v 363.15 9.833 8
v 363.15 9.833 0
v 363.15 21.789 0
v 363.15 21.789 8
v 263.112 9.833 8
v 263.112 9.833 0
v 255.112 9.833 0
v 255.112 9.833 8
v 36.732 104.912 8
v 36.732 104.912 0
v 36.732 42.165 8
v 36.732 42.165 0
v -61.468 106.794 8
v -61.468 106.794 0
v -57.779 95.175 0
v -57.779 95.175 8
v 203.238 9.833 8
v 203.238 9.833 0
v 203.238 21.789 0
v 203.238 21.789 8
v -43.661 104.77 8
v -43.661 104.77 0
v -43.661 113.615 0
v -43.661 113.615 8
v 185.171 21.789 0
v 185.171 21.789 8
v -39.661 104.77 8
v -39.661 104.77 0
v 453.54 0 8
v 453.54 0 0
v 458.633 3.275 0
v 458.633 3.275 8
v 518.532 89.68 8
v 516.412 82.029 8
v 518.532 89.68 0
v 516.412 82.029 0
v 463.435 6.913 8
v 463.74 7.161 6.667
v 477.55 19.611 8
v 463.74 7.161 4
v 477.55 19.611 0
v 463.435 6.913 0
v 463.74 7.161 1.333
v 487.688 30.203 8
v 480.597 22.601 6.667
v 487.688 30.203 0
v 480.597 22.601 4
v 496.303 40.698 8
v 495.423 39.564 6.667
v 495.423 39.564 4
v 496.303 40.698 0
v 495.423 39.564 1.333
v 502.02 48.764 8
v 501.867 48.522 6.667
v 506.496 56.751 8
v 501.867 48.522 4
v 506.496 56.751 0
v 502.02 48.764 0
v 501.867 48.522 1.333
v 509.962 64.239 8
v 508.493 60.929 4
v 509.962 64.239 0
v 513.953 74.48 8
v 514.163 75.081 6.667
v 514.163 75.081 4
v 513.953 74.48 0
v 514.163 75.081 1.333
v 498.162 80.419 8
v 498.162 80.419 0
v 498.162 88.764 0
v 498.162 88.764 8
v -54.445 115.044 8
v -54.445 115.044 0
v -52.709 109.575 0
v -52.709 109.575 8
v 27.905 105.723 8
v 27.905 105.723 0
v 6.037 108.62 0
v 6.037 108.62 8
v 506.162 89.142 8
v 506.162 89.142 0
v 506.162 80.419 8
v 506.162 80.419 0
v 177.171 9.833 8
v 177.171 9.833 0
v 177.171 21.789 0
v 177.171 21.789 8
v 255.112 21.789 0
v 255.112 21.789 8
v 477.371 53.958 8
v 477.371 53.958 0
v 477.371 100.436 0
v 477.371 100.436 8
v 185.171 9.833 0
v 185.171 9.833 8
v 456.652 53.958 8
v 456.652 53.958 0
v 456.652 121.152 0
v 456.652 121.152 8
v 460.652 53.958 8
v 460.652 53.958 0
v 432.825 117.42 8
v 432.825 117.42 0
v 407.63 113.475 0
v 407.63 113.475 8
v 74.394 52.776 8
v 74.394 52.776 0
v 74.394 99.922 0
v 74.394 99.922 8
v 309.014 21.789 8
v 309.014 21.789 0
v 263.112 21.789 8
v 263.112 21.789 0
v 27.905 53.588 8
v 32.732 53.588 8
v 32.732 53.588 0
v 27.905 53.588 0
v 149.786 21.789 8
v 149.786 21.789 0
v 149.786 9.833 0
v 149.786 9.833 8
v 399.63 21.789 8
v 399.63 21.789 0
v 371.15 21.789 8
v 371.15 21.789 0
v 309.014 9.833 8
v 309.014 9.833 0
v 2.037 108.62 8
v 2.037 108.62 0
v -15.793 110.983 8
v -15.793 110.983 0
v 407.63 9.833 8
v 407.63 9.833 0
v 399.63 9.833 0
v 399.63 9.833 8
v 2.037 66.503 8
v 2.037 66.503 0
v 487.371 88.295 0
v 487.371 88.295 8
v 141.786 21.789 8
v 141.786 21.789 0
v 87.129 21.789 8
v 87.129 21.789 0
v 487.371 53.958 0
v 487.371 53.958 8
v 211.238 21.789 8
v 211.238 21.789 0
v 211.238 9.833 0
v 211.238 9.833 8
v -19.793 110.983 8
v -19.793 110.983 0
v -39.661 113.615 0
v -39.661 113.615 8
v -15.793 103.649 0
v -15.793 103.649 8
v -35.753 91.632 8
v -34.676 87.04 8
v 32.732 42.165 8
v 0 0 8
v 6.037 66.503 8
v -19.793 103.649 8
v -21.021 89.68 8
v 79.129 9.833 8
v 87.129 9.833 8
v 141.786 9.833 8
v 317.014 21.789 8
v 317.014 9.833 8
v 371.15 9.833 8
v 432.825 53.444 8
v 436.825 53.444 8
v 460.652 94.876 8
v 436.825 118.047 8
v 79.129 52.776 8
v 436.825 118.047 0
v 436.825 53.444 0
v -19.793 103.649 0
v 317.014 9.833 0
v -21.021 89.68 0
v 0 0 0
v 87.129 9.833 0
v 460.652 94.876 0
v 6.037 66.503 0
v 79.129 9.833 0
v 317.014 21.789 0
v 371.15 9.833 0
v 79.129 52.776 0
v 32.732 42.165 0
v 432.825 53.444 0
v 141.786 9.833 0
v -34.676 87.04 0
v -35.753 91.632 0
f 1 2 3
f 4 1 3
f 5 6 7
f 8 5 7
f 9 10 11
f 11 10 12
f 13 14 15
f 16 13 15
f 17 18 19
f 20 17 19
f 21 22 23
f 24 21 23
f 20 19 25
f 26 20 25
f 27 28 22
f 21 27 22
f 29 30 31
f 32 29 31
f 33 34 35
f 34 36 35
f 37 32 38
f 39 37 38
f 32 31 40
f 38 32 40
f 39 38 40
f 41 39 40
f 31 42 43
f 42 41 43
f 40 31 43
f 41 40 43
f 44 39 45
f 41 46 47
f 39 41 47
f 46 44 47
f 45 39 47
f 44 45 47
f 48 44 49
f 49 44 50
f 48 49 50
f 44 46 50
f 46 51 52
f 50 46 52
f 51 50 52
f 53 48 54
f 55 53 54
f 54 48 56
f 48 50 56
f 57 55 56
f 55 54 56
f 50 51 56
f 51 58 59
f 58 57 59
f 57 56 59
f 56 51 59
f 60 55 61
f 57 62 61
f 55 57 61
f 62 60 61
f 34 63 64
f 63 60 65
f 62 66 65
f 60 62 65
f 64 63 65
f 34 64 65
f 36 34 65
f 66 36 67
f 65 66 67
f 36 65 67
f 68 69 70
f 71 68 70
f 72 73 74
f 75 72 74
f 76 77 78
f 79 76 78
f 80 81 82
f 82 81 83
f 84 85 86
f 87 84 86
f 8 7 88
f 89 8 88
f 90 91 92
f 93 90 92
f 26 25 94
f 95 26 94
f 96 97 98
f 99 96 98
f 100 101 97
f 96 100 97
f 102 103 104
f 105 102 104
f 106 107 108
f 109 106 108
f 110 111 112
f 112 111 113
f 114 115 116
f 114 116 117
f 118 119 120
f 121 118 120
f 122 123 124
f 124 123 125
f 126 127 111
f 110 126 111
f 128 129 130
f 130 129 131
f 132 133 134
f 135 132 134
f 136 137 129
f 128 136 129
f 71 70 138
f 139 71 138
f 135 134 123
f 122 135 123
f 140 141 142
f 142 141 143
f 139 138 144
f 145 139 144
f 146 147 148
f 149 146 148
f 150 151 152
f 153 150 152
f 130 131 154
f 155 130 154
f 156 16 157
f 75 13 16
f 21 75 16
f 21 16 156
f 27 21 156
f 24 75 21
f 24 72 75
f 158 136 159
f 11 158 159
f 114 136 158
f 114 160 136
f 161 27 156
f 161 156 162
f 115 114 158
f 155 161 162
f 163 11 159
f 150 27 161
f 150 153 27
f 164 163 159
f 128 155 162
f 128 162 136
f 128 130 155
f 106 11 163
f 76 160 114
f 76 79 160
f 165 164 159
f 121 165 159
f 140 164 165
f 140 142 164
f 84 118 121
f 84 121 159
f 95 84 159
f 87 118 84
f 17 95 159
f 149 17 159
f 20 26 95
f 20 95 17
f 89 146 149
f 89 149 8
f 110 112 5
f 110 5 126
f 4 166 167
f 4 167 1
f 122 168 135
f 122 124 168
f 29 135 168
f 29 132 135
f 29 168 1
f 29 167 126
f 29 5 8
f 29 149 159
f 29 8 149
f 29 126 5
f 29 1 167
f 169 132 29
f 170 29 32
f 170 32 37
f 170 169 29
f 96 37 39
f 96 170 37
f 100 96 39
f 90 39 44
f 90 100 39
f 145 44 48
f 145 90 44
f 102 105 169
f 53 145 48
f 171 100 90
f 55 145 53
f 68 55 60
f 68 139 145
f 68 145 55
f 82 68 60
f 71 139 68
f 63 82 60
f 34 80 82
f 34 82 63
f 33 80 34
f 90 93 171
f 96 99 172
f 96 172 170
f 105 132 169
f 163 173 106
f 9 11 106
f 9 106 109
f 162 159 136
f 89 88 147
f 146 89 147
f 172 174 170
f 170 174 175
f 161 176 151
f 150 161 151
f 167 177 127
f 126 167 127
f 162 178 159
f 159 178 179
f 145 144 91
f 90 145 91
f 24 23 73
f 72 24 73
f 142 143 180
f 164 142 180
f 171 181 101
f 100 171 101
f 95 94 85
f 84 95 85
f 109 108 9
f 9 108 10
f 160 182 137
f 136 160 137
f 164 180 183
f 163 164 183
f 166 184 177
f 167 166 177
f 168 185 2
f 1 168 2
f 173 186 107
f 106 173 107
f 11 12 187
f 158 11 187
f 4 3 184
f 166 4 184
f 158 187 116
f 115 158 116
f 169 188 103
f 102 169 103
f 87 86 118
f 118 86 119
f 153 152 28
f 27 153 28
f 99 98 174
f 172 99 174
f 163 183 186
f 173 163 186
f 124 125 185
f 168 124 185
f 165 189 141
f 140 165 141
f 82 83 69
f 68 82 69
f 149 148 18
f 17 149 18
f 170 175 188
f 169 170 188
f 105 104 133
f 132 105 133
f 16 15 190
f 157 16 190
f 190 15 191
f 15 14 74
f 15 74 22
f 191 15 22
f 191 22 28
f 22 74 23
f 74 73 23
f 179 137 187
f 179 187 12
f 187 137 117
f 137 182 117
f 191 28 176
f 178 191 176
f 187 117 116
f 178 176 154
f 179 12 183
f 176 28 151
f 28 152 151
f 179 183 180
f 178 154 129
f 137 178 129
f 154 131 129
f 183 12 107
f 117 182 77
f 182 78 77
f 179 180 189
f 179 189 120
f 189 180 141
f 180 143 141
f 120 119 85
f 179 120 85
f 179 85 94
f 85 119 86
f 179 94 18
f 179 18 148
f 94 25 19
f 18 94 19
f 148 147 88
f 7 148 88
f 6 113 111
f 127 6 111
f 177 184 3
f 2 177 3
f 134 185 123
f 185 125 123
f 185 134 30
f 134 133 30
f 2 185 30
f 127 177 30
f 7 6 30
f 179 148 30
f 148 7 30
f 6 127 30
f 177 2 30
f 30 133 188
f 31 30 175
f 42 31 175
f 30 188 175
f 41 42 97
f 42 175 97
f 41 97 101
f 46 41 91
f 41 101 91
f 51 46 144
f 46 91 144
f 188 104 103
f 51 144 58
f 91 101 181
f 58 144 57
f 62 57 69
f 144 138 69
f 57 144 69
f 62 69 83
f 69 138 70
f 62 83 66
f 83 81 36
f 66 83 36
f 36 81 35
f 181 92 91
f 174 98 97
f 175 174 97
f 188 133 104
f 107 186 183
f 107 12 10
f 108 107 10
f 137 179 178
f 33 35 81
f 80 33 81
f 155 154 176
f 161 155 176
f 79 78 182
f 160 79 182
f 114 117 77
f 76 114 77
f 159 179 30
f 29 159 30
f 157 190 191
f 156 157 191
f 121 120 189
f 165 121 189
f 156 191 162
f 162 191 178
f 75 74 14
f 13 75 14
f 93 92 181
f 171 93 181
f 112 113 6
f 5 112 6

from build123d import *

# Parameters (mm, degrees)
EXTRUDE_1_DEPTH = 8


with BuildPart() as part:
    # 草图1 → 凸台-拉伸1 (new body)
    with BuildSketch(Plane.XY):
        with BuildLine():
            Line((-2.43e-07, -1.66e-07), (453.540462303, -1.66e-07))
            add(Edge.make_bspline(
                [(453.540462303, -1.66e-07), (460.79014459, 4.210016878), (469.569935404, 12.072340183), (483.622239053, 25.284804164), (493.197401943, 36.434132834), (502.695793901, 49.189345623), (511.206090033, 65.729365299), (516.029726356, 79.831331018), (518.53173017, 89.679905798)],
                knots=[0, 0, 0, 0, 0.219529356, 0.311377144, 0.509994522, 0.607272861, 0.731274185, 1, 1, 1, 1], degree=3))
            Line((518.53173017, 89.679905798), (506.162046562, 89.142399996))
            Line((506.162046562, 89.142399996), (506.162046562, 80.419495843))
            Line((506.162046562, 80.419495843), (498.162046562, 80.419495843))
            Line((498.162046562, 80.419495843), (498.162046562, 88.764379516))
            Line((498.162046562, 88.764379516), (487.370707866, 88.295458294))
            Line((487.370707866, 88.295458294), (487.370707866, 53.957597962))
            Line((487.370707866, 53.957597962), (477.370707866, 53.957597962))
            Line((477.370707866, 53.957597962), (477.370707866, 100.436233428))
            Line((477.370707866, 100.436233428), (460.65154086, 94.876216939))
            Line((460.65154086, 94.876216939), (460.65154086, 53.957597679))
            Line((460.65154086, 53.957597679), (456.65154086, 53.957597679))
            Line((456.65154086, 53.957597679), (456.65154086, 121.15189914))
            Line((456.65154086, 121.15189914), (436.824501135, 118.046777247))
            Line((436.824501135, 118.046777247), (436.824501135, 53.44350708))
            Line((436.824501135, 53.44350708), (432.824501135, 53.44350708))
            Line((432.824501135, 53.44350708), (432.824501135, 117.420335391))
            Line((432.824501135, 117.420335391), (407.629534965, 113.474540047))
            Line((407.629534965, 113.474540047), (407.629534965, 9.833214458))
            Line((407.629534965, 9.833214458), (399.629534965, 9.833214458))
            Line((399.629534965, 9.833214458), (399.629534965, 21.78896428))
            Line((399.629534965, 21.78896428), (371.149712291, 21.78896428))
            Line((371.149712291, 21.78896428), (371.149712291, 9.833214458))
            Line((371.149712291, 9.833214458), (363.149712291, 9.833214458))
            Line((363.149712291, 9.833214458), (363.149712291, 21.78896428))
            Line((363.149712291, 21.78896428), (317.013742993, 21.78896428))
            Line((317.013742993, 21.78896428), (317.013742993, 9.833214458))
            Line((317.013742993, 9.833214458), (309.013742993, 9.833214458))
            Line((309.013742993, 9.833214458), (309.013742993, 21.78896428))
            Line((309.013742993, 21.78896428), (263.112020096, 21.78896428))
            Line((263.112020096, 21.78896428), (263.112020096, 9.833214458))
            Line((263.112020096, 9.833214458), (255.112020096, 9.833214458))
            Line((255.112020096, 9.833214458), (255.112020096, 21.78896428))
            Line((255.112020096, 21.78896428), (211.237889646, 21.78896428))
            Line((211.237889646, 21.78896428), (211.237889646, 9.833214458))
            Line((211.237889646, 9.833214458), (203.237889646, 9.833214458))
            Line((203.237889646, 9.833214458), (203.237889646, 21.78896428))
            Line((203.237889646, 21.78896428), (185.170557109, 21.78896428))
            Line((185.170557109, 21.78896428), (185.170557109, 9.833214458))
            Line((185.170557109, 9.833214458), (177.170557109, 9.833214458))
            Line((177.170557109, 9.833214458), (177.170557109, 21.788961022))
            Line((177.170557109, 21.788961022), (149.785514419, 21.788961022))
            Line((149.785514419, 21.788961022), (149.785514419, 9.8332112))
            Line((149.785514419, 9.8332112), (141.785514419, 9.8332112))
            Line((141.785514419, 9.8332112), (141.785514419, 21.788961022))
            Line((141.785514419, 21.788961022), (87.128628071, 21.788961022))
            Line((87.128628071, 21.788961022), (87.128628071, 9.8332112))
            Line((87.128628071, 9.8332112), (79.128628071, 9.8332112))
            Line((79.128628071, 9.8332112), (79.128628071, 52.776041795))
            Line((79.128628071, 52.776041795), (74.39423211, 52.776041795))
            Line((74.39423211, 52.776041795), (74.39423211, 99.922139289))
            Line((74.39423211, 99.922139289), (36.732316161, 104.912244585))
            Line((36.732316161, 104.912244585), (36.732316161, 42.164639479))
            Line((36.732316161, 42.164639479), (32.732316161, 42.164639479))
            Line((32.732316161, 42.164639479), (32.732316161, 53.588490785))
            Line((32.732316161, 53.588490785), (27.905397524, 53.588490785))
            Line((27.905397524, 53.588490785), (27.905397524, 105.722742646))
            Line((27.905397524, 105.722742646), (6.037252299, 108.620214656))
            Line((6.037252299, 108.620214656), (6.037252299, 66.502939453))
            Line((6.037252299, 66.502939453), (2.037252299, 66.502939453))
            Line((2.037252299, 66.502939453), (2.037252299, 108.620214656))
            Line((2.037252299, 108.620214656), (-15.79290681, 110.982664073))
            Line((-15.79290681, 110.982664073), (-15.79290681, 103.648933932))
            Line((-15.79290681, 103.648933932), (-19.79290681, 103.648933932))
            Line((-19.79290681, 103.648933932), (-19.79290681, 110.982664073))
            Line((-19.79290681, 110.982664073), (-39.660668521, 113.615090503))
            Line((-39.660668521, 113.615090503), (-39.660668521, 104.769973164))
            Line((-39.660668521, 104.769973164), (-43.660668521, 104.769973164))
            Line((-43.660668521, 104.769973164), (-43.660668521, 113.615090503))
            Line((-43.660668521, 113.615090503), (-54.444933748, 115.043977421))
            Line((-54.444933748, 115.043977421), (-52.708792967, 109.575431))
            Line((-52.708792967, 109.575431), (-61.468269832, 106.794493648))
            Line((-61.468269832, 106.794493648), (-57.779206202, 95.174574379))
            Line((-57.779206202, 95.174574379), (-34.676393157, 87.040279865))
            Line((-34.676393157, 87.040279865), (-35.752643056, 91.631850135))
            Line((-35.752643056, 91.631850135), (-21.020693304, 89.679905349))
            Line((-21.020693304, 89.679905349), (-2.43e-07, -1.66e-07))
        make_face()
    extrude(amount=EXTRUDE_1_DEPTH)


solid = part.part
